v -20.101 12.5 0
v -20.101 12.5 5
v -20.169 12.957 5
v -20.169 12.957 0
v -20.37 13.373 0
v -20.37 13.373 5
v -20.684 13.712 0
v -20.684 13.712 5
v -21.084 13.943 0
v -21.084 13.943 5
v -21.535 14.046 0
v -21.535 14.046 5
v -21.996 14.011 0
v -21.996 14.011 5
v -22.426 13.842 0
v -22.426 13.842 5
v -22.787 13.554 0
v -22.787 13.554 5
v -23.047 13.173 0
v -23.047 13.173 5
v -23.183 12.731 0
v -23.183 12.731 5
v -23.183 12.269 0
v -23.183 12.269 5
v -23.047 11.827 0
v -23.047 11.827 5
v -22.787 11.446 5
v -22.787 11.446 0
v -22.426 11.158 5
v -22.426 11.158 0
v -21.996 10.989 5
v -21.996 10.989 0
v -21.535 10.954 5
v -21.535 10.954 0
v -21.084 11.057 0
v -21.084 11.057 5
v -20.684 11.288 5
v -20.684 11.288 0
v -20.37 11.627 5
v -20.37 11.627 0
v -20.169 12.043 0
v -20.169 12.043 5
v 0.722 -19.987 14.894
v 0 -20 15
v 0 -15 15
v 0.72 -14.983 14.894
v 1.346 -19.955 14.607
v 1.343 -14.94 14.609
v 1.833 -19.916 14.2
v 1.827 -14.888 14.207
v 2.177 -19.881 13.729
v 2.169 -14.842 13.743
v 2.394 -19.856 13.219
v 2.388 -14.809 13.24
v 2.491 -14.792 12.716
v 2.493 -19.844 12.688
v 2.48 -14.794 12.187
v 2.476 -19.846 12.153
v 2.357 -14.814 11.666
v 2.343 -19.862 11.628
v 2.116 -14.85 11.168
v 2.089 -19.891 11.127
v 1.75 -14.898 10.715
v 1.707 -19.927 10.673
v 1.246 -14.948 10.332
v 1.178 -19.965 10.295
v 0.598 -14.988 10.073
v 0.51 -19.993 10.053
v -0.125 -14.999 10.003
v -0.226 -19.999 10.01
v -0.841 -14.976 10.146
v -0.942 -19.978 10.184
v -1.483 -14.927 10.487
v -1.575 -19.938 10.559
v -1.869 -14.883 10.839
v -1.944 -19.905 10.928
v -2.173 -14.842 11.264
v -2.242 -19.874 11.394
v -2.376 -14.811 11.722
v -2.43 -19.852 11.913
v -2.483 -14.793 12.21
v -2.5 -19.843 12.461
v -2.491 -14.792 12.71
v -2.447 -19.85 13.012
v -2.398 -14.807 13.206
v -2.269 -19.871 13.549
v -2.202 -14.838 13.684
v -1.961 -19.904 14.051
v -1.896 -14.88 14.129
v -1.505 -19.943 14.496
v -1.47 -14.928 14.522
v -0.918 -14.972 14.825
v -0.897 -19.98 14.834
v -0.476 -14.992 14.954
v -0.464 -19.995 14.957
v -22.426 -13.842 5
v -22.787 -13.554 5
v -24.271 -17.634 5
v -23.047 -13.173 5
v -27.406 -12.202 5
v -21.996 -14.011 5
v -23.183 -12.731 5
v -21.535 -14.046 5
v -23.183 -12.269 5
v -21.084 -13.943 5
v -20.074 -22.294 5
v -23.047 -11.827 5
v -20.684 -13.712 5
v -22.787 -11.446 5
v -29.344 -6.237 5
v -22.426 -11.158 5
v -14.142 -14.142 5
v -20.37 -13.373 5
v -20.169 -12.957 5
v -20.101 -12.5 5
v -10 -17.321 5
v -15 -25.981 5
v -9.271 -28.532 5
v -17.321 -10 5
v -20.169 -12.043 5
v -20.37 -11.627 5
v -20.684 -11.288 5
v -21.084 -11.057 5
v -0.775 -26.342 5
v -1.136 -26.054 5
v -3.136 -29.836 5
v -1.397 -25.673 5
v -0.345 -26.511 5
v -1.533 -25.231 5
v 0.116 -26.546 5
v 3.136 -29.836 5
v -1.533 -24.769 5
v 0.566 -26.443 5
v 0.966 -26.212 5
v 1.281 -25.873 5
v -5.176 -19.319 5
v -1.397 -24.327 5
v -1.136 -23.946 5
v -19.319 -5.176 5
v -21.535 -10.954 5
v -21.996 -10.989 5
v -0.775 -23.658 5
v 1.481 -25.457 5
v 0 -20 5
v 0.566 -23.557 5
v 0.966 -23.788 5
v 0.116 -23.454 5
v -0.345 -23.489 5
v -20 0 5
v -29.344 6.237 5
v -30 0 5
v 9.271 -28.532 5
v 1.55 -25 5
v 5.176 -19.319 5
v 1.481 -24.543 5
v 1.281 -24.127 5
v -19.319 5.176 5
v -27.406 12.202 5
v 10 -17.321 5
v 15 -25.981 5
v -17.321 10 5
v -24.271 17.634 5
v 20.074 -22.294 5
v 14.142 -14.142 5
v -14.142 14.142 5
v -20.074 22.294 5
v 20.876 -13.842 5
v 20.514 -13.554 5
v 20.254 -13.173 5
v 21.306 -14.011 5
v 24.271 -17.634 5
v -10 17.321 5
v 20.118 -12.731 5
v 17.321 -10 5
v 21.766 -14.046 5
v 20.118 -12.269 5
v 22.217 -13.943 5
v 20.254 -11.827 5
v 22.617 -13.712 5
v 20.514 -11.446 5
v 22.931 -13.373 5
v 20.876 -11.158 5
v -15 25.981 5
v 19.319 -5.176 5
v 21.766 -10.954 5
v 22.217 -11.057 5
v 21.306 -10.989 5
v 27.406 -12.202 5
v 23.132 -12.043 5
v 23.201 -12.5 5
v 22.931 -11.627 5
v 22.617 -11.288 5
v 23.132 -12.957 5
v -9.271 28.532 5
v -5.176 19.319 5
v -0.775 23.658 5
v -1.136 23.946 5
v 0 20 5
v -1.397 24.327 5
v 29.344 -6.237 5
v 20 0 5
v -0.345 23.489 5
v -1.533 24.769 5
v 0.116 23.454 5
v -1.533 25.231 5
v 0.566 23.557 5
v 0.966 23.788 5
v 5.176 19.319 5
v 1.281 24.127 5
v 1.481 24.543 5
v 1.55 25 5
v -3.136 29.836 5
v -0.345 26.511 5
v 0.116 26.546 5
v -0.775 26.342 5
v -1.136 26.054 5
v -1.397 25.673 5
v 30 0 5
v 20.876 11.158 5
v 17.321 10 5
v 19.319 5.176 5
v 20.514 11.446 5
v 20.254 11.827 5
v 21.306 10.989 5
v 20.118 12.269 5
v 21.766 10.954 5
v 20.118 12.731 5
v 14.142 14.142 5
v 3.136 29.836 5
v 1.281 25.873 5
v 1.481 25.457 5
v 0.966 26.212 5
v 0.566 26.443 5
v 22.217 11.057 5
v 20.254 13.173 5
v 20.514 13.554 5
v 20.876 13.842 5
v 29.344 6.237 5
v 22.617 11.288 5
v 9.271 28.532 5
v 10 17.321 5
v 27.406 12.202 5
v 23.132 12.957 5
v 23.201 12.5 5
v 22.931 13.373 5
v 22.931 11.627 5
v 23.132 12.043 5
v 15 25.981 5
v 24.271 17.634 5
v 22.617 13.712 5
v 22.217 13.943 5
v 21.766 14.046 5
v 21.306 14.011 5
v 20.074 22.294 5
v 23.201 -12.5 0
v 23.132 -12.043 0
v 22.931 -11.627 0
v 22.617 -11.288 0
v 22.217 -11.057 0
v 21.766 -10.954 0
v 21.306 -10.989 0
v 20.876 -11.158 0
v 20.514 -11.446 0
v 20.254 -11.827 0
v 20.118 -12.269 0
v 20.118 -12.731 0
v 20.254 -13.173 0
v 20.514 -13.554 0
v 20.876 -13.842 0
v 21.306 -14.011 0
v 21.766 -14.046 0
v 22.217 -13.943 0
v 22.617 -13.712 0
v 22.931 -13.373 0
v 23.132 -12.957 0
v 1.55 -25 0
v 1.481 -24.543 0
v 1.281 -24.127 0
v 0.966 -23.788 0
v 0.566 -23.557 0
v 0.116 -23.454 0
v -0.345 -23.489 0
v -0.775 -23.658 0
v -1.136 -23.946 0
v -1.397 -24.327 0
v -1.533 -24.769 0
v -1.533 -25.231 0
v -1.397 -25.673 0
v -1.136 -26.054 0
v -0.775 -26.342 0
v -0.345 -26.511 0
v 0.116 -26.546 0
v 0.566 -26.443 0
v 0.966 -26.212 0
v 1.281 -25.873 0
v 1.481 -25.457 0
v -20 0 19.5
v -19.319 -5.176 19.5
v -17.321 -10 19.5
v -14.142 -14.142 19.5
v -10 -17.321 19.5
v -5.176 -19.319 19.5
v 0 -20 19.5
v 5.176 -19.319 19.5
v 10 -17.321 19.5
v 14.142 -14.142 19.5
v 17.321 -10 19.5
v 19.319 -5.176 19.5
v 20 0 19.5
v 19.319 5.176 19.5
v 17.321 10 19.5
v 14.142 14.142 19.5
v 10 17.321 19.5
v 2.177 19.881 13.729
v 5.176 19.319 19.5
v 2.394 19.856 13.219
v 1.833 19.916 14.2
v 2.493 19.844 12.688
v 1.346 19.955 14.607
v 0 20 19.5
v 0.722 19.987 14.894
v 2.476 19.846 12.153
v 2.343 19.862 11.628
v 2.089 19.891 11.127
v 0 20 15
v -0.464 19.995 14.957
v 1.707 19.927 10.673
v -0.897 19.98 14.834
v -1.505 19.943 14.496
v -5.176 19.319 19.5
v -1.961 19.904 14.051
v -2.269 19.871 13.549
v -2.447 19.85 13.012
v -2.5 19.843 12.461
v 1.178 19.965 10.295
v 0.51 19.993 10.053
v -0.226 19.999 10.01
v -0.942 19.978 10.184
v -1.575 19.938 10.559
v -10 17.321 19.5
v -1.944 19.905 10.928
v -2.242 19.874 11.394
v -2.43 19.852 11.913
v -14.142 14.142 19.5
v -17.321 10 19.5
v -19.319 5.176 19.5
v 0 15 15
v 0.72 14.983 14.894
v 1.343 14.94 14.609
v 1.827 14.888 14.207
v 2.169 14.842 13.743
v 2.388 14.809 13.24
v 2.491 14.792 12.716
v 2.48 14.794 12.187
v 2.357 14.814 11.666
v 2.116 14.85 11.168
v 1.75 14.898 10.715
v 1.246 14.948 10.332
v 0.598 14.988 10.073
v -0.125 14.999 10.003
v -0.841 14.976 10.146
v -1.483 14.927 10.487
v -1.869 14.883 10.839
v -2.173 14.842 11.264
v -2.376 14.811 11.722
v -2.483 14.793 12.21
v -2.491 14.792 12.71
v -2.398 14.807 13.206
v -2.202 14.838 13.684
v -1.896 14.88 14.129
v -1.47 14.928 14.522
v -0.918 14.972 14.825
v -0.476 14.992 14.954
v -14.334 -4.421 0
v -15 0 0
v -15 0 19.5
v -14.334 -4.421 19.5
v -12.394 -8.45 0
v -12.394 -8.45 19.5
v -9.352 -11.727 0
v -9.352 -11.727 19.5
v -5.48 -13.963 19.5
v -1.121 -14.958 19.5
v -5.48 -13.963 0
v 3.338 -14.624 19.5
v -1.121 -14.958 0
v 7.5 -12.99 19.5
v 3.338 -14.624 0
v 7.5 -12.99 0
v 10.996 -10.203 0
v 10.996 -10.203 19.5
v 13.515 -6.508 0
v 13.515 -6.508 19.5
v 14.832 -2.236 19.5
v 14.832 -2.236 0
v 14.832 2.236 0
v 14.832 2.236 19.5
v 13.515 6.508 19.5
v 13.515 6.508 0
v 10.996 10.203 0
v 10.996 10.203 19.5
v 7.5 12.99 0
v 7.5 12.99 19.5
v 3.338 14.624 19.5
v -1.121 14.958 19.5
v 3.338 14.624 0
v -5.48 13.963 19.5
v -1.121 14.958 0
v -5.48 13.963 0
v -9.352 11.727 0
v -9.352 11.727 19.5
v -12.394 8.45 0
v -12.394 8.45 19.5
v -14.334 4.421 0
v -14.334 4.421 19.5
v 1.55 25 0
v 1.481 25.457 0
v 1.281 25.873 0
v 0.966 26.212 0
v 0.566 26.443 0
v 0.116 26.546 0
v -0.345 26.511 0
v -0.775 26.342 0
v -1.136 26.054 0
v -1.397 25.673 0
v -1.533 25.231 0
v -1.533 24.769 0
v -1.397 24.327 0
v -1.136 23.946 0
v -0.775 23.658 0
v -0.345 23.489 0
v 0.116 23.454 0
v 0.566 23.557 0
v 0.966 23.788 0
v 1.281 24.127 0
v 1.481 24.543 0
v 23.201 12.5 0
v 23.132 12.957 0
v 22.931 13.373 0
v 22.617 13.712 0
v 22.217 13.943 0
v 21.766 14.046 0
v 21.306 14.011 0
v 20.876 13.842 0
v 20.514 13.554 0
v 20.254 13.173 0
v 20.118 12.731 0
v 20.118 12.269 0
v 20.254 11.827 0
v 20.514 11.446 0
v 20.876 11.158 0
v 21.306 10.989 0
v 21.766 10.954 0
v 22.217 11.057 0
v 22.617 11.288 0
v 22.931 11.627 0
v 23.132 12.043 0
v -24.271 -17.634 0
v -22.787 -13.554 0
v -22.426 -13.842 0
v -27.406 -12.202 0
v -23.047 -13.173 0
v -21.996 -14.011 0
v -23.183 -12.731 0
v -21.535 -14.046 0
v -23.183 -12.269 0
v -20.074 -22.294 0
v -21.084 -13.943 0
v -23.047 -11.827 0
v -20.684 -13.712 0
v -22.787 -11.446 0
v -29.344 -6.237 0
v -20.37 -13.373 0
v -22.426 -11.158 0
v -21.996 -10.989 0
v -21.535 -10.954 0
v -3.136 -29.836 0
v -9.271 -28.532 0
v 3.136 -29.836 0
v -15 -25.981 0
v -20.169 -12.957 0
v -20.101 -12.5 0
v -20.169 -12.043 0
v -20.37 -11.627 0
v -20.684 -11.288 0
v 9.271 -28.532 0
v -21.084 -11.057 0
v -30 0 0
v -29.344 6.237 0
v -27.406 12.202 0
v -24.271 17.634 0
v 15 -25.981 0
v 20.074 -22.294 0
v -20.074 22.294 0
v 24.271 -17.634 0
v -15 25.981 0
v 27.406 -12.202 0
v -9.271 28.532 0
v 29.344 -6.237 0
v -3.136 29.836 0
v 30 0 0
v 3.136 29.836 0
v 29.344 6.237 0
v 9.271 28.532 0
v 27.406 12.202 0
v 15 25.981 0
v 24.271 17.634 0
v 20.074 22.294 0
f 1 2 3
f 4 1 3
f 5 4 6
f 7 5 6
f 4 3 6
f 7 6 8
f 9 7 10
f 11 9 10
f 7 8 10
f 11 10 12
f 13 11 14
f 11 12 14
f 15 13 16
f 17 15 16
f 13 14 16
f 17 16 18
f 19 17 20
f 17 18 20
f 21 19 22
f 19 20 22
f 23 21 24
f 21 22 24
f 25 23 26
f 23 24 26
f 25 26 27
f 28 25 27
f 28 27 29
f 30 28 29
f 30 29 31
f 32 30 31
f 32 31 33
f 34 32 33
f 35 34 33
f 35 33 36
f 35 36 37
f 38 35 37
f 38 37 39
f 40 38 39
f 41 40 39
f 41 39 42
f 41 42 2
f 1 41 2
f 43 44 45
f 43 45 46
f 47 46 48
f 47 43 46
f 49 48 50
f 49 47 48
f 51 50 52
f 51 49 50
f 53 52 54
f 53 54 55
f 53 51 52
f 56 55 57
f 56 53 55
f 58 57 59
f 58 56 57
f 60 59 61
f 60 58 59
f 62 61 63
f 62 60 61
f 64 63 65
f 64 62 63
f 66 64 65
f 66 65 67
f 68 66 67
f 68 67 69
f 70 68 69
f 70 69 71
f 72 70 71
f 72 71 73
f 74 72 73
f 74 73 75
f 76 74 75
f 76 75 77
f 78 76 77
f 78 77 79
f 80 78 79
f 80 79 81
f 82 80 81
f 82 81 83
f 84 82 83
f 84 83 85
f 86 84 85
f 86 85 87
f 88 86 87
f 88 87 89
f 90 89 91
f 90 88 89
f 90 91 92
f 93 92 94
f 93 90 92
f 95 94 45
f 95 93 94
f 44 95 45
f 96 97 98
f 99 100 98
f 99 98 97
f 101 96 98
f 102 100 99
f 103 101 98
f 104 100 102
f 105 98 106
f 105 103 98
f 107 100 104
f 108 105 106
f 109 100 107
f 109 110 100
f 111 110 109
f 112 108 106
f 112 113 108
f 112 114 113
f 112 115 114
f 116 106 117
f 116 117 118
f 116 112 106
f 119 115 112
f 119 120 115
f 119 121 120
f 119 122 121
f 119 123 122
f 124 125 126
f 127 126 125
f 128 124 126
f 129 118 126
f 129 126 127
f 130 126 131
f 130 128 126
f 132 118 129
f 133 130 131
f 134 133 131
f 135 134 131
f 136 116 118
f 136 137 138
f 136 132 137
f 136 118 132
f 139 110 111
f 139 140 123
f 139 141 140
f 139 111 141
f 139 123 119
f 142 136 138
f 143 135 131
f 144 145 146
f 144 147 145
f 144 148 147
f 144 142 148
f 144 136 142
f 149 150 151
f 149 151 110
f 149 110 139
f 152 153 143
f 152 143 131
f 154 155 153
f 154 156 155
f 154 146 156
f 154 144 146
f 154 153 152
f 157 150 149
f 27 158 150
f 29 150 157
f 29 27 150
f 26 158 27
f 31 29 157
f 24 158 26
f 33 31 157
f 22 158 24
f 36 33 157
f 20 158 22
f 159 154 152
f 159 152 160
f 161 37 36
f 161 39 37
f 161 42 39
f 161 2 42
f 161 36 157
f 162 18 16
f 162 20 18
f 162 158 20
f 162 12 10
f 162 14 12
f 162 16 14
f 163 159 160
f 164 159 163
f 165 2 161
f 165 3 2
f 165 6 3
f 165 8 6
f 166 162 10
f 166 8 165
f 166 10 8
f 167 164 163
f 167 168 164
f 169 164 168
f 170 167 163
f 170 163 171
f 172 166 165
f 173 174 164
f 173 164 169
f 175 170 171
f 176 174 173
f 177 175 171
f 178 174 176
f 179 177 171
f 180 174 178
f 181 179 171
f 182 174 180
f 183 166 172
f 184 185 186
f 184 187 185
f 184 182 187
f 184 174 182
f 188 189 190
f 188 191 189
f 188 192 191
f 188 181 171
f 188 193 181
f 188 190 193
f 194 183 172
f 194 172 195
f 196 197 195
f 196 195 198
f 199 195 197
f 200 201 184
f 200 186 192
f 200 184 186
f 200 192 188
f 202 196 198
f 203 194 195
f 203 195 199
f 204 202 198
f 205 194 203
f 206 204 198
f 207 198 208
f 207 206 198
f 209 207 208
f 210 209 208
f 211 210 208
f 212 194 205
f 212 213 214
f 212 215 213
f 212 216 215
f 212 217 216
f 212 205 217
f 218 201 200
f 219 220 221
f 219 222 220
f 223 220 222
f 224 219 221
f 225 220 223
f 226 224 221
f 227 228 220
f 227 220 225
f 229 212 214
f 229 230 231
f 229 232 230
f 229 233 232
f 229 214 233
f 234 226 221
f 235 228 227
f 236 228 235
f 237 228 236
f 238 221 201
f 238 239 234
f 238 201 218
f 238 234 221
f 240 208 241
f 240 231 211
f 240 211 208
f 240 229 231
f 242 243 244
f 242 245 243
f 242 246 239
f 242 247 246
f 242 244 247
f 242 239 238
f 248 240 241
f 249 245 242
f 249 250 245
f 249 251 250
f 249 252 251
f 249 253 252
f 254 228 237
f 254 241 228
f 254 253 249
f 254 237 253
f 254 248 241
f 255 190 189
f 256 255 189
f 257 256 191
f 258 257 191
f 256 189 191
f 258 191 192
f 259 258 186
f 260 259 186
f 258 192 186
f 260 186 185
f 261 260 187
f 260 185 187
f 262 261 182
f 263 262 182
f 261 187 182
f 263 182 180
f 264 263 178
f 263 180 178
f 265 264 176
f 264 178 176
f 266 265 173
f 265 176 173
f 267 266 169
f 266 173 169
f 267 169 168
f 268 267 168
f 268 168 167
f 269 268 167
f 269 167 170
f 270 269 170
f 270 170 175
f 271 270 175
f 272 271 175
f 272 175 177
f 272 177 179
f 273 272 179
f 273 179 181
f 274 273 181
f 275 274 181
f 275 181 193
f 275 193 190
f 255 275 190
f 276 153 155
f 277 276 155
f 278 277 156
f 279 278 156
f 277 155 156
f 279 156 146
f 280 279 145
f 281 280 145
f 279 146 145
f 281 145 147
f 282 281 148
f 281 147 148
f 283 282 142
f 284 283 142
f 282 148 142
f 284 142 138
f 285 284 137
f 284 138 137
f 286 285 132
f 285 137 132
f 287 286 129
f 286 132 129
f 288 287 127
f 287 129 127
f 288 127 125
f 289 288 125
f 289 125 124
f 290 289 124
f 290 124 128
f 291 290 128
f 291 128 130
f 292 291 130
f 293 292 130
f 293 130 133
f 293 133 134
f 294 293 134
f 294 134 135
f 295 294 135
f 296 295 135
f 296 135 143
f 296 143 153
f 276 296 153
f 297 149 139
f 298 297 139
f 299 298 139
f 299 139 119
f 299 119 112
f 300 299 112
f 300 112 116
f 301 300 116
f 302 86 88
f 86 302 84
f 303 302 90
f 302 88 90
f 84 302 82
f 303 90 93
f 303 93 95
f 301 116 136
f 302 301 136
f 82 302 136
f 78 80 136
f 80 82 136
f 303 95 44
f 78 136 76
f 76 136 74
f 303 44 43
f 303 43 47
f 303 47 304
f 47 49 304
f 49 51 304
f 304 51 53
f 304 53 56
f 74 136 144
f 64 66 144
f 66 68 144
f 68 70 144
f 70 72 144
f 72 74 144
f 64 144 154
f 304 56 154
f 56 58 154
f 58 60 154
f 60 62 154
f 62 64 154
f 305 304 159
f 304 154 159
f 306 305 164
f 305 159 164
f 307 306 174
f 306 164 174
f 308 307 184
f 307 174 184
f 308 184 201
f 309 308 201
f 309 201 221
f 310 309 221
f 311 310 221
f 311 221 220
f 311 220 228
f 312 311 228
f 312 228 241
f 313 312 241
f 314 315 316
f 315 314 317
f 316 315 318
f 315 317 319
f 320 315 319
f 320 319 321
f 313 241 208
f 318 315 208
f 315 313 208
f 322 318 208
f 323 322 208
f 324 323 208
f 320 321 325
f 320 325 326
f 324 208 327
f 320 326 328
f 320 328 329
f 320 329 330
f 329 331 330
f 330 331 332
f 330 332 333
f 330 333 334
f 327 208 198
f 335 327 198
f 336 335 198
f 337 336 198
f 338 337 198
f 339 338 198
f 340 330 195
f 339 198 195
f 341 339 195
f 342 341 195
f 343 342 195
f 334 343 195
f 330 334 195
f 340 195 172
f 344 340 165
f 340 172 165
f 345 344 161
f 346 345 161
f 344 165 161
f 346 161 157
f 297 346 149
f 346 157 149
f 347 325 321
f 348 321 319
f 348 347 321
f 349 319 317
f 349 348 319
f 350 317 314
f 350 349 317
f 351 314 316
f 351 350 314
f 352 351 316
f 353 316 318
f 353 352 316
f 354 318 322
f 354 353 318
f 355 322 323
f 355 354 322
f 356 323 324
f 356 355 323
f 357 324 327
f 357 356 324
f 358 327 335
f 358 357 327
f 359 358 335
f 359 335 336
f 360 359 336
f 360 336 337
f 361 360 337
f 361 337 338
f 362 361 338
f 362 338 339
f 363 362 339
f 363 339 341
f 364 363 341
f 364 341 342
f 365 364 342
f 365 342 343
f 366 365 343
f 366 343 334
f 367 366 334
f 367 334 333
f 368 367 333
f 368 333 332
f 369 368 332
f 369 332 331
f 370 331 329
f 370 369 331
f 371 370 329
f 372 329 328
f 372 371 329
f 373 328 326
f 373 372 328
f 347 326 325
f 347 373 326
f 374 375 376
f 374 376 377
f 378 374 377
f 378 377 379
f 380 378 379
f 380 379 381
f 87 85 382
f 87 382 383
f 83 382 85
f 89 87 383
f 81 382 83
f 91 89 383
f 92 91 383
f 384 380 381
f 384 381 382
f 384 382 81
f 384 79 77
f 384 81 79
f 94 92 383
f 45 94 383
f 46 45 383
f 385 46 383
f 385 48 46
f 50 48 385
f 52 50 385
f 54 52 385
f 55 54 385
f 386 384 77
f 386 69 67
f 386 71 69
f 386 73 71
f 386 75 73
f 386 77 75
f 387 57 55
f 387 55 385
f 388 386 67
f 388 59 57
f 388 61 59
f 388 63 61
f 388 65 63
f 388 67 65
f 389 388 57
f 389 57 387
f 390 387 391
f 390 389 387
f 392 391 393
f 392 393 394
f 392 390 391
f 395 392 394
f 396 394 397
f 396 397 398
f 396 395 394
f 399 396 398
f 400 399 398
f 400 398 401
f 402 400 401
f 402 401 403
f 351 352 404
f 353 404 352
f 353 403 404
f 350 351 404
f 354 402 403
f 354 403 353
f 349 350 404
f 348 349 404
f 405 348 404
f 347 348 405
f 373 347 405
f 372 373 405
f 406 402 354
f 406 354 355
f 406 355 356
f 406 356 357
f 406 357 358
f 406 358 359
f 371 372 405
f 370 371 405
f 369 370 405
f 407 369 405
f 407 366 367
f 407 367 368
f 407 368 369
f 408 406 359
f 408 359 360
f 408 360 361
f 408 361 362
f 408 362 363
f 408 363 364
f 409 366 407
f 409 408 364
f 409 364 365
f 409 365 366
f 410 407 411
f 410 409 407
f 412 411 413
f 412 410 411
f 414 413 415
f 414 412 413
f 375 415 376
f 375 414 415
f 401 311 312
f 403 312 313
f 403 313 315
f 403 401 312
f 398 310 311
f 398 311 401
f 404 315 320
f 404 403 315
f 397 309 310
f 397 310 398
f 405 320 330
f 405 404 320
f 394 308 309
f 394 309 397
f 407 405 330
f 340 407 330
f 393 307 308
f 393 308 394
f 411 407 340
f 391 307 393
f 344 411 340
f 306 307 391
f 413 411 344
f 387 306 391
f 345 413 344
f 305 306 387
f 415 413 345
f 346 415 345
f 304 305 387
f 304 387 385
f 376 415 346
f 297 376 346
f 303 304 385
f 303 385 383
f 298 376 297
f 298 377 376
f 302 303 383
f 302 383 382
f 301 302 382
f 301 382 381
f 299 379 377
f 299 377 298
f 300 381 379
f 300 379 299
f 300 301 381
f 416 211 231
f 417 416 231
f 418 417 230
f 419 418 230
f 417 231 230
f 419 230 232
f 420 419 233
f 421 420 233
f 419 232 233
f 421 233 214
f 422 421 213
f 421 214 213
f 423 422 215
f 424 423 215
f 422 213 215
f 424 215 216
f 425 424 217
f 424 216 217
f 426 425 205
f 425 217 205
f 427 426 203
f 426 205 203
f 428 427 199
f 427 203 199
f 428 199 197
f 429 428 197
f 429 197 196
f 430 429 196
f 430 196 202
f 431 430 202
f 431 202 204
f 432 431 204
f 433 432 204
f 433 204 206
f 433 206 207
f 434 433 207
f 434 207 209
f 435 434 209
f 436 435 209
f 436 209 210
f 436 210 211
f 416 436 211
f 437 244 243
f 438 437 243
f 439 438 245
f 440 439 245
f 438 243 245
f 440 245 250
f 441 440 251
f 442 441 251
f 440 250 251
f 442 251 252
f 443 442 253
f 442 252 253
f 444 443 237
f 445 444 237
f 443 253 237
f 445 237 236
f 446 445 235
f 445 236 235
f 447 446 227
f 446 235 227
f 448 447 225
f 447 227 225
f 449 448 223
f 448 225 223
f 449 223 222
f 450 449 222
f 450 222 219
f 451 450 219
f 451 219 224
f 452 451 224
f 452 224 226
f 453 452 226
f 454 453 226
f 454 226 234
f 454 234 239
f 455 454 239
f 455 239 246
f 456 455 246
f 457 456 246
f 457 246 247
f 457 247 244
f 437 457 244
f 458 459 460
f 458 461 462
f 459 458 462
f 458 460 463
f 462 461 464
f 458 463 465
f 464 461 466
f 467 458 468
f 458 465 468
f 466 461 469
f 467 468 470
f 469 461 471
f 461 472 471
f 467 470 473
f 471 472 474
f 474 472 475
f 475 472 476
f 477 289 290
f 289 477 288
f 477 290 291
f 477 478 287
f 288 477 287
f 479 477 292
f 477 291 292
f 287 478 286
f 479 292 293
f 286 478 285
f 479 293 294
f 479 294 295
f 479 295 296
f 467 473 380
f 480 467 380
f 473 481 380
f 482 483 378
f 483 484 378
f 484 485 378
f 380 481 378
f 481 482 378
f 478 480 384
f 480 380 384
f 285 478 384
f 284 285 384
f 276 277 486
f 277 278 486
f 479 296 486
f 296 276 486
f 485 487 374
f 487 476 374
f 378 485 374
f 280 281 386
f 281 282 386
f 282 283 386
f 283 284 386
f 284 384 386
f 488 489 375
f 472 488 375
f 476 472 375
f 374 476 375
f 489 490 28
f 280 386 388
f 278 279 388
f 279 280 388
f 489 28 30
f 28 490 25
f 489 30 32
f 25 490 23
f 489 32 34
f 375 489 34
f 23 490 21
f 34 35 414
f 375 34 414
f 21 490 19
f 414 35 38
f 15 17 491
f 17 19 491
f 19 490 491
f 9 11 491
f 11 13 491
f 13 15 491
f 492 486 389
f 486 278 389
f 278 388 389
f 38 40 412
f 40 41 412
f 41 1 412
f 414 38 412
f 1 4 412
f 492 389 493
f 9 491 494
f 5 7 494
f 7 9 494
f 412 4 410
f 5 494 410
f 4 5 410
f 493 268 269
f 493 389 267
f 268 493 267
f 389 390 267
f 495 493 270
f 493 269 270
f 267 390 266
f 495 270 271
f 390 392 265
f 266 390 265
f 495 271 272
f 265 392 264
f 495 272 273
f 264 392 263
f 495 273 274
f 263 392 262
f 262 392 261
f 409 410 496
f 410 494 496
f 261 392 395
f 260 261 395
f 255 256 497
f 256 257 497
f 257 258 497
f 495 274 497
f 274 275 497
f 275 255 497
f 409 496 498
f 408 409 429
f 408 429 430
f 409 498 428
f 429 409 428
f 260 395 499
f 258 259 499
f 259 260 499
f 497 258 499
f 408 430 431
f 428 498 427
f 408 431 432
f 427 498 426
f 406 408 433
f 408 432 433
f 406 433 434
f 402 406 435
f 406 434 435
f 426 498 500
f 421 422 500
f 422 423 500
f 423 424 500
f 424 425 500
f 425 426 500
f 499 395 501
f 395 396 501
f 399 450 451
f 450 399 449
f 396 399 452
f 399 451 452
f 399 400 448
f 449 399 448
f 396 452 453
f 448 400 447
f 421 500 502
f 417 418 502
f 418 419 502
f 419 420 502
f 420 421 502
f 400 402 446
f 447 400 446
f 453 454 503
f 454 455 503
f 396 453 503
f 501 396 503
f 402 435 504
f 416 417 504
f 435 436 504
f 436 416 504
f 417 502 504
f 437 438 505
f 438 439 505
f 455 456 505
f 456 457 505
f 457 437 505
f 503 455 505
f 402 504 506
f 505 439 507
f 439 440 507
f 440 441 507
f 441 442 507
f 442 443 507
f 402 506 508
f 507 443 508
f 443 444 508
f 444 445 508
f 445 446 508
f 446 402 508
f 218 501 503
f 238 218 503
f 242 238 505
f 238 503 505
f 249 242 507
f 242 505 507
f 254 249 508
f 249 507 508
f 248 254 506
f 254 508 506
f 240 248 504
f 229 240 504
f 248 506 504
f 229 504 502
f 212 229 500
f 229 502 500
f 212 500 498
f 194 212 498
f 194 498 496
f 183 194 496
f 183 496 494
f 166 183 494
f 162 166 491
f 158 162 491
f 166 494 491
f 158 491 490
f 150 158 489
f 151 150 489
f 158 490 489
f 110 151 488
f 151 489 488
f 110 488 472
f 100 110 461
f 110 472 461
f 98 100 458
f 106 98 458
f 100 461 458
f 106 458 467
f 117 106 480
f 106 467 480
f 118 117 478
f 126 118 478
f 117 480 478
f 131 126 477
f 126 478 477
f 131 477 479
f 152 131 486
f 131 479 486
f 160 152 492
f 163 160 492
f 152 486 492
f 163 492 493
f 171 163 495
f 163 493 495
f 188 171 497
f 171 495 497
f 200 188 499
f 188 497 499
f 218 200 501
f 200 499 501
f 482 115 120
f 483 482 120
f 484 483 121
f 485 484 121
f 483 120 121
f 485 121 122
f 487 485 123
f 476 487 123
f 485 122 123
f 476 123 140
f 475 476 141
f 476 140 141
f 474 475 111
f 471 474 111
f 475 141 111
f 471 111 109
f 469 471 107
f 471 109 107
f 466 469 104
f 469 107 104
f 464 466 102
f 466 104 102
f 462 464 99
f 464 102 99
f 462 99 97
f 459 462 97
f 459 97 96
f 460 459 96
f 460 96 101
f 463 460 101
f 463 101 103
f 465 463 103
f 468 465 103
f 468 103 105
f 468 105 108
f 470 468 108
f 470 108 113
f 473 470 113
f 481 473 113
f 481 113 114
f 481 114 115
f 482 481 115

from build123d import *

# Parameters (mm, degrees)
SKETCH1_R               = 30
BOSS_EXTRUDE1_DEPTH     = 5
SKETCH2_R               = 20
SKETCH2_R_2             = 15
BOSS_EXTRUDE2_DEPTH     = 14.5
CUT_EXTRUDE1_START      = -20
SKETCH3_R               = 15
CUT_EXTRUDE1_DEPTH      = 20
CUT_EXTRUDE3_DEPTH      = 47.693147249
CUT_EXTRUDE3_DEPTH_BACK = 47.693147249
SKETCH5_R               = 2.5
SKETCH6_R               = 1.55
CUT_EXTRUDE4_DEPTH      = 10


with BuildPart() as part:
    # Sketch1 → Boss-Extrude1 (new body)
    with BuildSketch(Plane.XY):
        Circle(SKETCH1_R)
    extrude(amount=BOSS_EXTRUDE1_DEPTH)

    # Sketch2 → Boss-Extrude2 (add)
    with BuildSketch(Plane.XY.offset(5)):
        with Locations(Location((0, 0, 0), (0, 0, 180))):
            Circle(SKETCH2_R)
        with Locations(Location((0, 0, 0), (0, 0, 180))):
            Circle(SKETCH2_R_2, mode=Mode.SUBTRACT)
    extrude(amount=BOSS_EXTRUDE2_DEPTH)

    # Sketch3 → Cut-Extrude1 (cut)
    with BuildSketch(Plane.XY.offset(5).offset(CUT_EXTRUDE1_START)):
        with Locations(Location((0, 0, 0), (0, 0, 180))):
            Circle(SKETCH3_R)
    extrude(amount=CUT_EXTRUDE1_DEPTH, mode=Mode.SUBTRACT)

    # Sketch5 → Cut-Extrude3 (cut, two sides: drawn at the far end of the back side and taken through both)
    with BuildSketch(Plane(origin=(0, 0, 0), x_dir=(1, 0, 0), z_dir=(0, 1, 0)).offset(-CUT_EXTRUDE3_DEPTH_BACK)):
        with Locations(Location((0, -12.5, 0), (0, 0, 270))):
            Circle(SKETCH5_R)
    extrude(amount=CUT_EXTRUDE3_DEPTH + CUT_EXTRUDE3_DEPTH_BACK, mode=Mode.SUBTRACT)

    # Sketch6 → Cut-Extrude4 (cut)
    with BuildSketch(Plane.XY.offset(5)):
        with Locations((0, 25)):
            Circle(SKETCH6_R)
        with Locations((21.650635095, 12.5)):
            Circle(SKETCH6_R)
        with Locations((21.650635095, -12.5)):
            Circle(SKETCH6_R)
        with Locations((0, -25)):
            Circle(SKETCH6_R)
        with Locations((-21.650635095, -12.5)):
            Circle(SKETCH6_R)
        with Locations((-21.650635095, 12.5)):
            Circle(SKETCH6_R)
    extrude(amount=-CUT_EXTRUDE4_DEPTH, mode=Mode.SUBTRACT)


solid = part.part
